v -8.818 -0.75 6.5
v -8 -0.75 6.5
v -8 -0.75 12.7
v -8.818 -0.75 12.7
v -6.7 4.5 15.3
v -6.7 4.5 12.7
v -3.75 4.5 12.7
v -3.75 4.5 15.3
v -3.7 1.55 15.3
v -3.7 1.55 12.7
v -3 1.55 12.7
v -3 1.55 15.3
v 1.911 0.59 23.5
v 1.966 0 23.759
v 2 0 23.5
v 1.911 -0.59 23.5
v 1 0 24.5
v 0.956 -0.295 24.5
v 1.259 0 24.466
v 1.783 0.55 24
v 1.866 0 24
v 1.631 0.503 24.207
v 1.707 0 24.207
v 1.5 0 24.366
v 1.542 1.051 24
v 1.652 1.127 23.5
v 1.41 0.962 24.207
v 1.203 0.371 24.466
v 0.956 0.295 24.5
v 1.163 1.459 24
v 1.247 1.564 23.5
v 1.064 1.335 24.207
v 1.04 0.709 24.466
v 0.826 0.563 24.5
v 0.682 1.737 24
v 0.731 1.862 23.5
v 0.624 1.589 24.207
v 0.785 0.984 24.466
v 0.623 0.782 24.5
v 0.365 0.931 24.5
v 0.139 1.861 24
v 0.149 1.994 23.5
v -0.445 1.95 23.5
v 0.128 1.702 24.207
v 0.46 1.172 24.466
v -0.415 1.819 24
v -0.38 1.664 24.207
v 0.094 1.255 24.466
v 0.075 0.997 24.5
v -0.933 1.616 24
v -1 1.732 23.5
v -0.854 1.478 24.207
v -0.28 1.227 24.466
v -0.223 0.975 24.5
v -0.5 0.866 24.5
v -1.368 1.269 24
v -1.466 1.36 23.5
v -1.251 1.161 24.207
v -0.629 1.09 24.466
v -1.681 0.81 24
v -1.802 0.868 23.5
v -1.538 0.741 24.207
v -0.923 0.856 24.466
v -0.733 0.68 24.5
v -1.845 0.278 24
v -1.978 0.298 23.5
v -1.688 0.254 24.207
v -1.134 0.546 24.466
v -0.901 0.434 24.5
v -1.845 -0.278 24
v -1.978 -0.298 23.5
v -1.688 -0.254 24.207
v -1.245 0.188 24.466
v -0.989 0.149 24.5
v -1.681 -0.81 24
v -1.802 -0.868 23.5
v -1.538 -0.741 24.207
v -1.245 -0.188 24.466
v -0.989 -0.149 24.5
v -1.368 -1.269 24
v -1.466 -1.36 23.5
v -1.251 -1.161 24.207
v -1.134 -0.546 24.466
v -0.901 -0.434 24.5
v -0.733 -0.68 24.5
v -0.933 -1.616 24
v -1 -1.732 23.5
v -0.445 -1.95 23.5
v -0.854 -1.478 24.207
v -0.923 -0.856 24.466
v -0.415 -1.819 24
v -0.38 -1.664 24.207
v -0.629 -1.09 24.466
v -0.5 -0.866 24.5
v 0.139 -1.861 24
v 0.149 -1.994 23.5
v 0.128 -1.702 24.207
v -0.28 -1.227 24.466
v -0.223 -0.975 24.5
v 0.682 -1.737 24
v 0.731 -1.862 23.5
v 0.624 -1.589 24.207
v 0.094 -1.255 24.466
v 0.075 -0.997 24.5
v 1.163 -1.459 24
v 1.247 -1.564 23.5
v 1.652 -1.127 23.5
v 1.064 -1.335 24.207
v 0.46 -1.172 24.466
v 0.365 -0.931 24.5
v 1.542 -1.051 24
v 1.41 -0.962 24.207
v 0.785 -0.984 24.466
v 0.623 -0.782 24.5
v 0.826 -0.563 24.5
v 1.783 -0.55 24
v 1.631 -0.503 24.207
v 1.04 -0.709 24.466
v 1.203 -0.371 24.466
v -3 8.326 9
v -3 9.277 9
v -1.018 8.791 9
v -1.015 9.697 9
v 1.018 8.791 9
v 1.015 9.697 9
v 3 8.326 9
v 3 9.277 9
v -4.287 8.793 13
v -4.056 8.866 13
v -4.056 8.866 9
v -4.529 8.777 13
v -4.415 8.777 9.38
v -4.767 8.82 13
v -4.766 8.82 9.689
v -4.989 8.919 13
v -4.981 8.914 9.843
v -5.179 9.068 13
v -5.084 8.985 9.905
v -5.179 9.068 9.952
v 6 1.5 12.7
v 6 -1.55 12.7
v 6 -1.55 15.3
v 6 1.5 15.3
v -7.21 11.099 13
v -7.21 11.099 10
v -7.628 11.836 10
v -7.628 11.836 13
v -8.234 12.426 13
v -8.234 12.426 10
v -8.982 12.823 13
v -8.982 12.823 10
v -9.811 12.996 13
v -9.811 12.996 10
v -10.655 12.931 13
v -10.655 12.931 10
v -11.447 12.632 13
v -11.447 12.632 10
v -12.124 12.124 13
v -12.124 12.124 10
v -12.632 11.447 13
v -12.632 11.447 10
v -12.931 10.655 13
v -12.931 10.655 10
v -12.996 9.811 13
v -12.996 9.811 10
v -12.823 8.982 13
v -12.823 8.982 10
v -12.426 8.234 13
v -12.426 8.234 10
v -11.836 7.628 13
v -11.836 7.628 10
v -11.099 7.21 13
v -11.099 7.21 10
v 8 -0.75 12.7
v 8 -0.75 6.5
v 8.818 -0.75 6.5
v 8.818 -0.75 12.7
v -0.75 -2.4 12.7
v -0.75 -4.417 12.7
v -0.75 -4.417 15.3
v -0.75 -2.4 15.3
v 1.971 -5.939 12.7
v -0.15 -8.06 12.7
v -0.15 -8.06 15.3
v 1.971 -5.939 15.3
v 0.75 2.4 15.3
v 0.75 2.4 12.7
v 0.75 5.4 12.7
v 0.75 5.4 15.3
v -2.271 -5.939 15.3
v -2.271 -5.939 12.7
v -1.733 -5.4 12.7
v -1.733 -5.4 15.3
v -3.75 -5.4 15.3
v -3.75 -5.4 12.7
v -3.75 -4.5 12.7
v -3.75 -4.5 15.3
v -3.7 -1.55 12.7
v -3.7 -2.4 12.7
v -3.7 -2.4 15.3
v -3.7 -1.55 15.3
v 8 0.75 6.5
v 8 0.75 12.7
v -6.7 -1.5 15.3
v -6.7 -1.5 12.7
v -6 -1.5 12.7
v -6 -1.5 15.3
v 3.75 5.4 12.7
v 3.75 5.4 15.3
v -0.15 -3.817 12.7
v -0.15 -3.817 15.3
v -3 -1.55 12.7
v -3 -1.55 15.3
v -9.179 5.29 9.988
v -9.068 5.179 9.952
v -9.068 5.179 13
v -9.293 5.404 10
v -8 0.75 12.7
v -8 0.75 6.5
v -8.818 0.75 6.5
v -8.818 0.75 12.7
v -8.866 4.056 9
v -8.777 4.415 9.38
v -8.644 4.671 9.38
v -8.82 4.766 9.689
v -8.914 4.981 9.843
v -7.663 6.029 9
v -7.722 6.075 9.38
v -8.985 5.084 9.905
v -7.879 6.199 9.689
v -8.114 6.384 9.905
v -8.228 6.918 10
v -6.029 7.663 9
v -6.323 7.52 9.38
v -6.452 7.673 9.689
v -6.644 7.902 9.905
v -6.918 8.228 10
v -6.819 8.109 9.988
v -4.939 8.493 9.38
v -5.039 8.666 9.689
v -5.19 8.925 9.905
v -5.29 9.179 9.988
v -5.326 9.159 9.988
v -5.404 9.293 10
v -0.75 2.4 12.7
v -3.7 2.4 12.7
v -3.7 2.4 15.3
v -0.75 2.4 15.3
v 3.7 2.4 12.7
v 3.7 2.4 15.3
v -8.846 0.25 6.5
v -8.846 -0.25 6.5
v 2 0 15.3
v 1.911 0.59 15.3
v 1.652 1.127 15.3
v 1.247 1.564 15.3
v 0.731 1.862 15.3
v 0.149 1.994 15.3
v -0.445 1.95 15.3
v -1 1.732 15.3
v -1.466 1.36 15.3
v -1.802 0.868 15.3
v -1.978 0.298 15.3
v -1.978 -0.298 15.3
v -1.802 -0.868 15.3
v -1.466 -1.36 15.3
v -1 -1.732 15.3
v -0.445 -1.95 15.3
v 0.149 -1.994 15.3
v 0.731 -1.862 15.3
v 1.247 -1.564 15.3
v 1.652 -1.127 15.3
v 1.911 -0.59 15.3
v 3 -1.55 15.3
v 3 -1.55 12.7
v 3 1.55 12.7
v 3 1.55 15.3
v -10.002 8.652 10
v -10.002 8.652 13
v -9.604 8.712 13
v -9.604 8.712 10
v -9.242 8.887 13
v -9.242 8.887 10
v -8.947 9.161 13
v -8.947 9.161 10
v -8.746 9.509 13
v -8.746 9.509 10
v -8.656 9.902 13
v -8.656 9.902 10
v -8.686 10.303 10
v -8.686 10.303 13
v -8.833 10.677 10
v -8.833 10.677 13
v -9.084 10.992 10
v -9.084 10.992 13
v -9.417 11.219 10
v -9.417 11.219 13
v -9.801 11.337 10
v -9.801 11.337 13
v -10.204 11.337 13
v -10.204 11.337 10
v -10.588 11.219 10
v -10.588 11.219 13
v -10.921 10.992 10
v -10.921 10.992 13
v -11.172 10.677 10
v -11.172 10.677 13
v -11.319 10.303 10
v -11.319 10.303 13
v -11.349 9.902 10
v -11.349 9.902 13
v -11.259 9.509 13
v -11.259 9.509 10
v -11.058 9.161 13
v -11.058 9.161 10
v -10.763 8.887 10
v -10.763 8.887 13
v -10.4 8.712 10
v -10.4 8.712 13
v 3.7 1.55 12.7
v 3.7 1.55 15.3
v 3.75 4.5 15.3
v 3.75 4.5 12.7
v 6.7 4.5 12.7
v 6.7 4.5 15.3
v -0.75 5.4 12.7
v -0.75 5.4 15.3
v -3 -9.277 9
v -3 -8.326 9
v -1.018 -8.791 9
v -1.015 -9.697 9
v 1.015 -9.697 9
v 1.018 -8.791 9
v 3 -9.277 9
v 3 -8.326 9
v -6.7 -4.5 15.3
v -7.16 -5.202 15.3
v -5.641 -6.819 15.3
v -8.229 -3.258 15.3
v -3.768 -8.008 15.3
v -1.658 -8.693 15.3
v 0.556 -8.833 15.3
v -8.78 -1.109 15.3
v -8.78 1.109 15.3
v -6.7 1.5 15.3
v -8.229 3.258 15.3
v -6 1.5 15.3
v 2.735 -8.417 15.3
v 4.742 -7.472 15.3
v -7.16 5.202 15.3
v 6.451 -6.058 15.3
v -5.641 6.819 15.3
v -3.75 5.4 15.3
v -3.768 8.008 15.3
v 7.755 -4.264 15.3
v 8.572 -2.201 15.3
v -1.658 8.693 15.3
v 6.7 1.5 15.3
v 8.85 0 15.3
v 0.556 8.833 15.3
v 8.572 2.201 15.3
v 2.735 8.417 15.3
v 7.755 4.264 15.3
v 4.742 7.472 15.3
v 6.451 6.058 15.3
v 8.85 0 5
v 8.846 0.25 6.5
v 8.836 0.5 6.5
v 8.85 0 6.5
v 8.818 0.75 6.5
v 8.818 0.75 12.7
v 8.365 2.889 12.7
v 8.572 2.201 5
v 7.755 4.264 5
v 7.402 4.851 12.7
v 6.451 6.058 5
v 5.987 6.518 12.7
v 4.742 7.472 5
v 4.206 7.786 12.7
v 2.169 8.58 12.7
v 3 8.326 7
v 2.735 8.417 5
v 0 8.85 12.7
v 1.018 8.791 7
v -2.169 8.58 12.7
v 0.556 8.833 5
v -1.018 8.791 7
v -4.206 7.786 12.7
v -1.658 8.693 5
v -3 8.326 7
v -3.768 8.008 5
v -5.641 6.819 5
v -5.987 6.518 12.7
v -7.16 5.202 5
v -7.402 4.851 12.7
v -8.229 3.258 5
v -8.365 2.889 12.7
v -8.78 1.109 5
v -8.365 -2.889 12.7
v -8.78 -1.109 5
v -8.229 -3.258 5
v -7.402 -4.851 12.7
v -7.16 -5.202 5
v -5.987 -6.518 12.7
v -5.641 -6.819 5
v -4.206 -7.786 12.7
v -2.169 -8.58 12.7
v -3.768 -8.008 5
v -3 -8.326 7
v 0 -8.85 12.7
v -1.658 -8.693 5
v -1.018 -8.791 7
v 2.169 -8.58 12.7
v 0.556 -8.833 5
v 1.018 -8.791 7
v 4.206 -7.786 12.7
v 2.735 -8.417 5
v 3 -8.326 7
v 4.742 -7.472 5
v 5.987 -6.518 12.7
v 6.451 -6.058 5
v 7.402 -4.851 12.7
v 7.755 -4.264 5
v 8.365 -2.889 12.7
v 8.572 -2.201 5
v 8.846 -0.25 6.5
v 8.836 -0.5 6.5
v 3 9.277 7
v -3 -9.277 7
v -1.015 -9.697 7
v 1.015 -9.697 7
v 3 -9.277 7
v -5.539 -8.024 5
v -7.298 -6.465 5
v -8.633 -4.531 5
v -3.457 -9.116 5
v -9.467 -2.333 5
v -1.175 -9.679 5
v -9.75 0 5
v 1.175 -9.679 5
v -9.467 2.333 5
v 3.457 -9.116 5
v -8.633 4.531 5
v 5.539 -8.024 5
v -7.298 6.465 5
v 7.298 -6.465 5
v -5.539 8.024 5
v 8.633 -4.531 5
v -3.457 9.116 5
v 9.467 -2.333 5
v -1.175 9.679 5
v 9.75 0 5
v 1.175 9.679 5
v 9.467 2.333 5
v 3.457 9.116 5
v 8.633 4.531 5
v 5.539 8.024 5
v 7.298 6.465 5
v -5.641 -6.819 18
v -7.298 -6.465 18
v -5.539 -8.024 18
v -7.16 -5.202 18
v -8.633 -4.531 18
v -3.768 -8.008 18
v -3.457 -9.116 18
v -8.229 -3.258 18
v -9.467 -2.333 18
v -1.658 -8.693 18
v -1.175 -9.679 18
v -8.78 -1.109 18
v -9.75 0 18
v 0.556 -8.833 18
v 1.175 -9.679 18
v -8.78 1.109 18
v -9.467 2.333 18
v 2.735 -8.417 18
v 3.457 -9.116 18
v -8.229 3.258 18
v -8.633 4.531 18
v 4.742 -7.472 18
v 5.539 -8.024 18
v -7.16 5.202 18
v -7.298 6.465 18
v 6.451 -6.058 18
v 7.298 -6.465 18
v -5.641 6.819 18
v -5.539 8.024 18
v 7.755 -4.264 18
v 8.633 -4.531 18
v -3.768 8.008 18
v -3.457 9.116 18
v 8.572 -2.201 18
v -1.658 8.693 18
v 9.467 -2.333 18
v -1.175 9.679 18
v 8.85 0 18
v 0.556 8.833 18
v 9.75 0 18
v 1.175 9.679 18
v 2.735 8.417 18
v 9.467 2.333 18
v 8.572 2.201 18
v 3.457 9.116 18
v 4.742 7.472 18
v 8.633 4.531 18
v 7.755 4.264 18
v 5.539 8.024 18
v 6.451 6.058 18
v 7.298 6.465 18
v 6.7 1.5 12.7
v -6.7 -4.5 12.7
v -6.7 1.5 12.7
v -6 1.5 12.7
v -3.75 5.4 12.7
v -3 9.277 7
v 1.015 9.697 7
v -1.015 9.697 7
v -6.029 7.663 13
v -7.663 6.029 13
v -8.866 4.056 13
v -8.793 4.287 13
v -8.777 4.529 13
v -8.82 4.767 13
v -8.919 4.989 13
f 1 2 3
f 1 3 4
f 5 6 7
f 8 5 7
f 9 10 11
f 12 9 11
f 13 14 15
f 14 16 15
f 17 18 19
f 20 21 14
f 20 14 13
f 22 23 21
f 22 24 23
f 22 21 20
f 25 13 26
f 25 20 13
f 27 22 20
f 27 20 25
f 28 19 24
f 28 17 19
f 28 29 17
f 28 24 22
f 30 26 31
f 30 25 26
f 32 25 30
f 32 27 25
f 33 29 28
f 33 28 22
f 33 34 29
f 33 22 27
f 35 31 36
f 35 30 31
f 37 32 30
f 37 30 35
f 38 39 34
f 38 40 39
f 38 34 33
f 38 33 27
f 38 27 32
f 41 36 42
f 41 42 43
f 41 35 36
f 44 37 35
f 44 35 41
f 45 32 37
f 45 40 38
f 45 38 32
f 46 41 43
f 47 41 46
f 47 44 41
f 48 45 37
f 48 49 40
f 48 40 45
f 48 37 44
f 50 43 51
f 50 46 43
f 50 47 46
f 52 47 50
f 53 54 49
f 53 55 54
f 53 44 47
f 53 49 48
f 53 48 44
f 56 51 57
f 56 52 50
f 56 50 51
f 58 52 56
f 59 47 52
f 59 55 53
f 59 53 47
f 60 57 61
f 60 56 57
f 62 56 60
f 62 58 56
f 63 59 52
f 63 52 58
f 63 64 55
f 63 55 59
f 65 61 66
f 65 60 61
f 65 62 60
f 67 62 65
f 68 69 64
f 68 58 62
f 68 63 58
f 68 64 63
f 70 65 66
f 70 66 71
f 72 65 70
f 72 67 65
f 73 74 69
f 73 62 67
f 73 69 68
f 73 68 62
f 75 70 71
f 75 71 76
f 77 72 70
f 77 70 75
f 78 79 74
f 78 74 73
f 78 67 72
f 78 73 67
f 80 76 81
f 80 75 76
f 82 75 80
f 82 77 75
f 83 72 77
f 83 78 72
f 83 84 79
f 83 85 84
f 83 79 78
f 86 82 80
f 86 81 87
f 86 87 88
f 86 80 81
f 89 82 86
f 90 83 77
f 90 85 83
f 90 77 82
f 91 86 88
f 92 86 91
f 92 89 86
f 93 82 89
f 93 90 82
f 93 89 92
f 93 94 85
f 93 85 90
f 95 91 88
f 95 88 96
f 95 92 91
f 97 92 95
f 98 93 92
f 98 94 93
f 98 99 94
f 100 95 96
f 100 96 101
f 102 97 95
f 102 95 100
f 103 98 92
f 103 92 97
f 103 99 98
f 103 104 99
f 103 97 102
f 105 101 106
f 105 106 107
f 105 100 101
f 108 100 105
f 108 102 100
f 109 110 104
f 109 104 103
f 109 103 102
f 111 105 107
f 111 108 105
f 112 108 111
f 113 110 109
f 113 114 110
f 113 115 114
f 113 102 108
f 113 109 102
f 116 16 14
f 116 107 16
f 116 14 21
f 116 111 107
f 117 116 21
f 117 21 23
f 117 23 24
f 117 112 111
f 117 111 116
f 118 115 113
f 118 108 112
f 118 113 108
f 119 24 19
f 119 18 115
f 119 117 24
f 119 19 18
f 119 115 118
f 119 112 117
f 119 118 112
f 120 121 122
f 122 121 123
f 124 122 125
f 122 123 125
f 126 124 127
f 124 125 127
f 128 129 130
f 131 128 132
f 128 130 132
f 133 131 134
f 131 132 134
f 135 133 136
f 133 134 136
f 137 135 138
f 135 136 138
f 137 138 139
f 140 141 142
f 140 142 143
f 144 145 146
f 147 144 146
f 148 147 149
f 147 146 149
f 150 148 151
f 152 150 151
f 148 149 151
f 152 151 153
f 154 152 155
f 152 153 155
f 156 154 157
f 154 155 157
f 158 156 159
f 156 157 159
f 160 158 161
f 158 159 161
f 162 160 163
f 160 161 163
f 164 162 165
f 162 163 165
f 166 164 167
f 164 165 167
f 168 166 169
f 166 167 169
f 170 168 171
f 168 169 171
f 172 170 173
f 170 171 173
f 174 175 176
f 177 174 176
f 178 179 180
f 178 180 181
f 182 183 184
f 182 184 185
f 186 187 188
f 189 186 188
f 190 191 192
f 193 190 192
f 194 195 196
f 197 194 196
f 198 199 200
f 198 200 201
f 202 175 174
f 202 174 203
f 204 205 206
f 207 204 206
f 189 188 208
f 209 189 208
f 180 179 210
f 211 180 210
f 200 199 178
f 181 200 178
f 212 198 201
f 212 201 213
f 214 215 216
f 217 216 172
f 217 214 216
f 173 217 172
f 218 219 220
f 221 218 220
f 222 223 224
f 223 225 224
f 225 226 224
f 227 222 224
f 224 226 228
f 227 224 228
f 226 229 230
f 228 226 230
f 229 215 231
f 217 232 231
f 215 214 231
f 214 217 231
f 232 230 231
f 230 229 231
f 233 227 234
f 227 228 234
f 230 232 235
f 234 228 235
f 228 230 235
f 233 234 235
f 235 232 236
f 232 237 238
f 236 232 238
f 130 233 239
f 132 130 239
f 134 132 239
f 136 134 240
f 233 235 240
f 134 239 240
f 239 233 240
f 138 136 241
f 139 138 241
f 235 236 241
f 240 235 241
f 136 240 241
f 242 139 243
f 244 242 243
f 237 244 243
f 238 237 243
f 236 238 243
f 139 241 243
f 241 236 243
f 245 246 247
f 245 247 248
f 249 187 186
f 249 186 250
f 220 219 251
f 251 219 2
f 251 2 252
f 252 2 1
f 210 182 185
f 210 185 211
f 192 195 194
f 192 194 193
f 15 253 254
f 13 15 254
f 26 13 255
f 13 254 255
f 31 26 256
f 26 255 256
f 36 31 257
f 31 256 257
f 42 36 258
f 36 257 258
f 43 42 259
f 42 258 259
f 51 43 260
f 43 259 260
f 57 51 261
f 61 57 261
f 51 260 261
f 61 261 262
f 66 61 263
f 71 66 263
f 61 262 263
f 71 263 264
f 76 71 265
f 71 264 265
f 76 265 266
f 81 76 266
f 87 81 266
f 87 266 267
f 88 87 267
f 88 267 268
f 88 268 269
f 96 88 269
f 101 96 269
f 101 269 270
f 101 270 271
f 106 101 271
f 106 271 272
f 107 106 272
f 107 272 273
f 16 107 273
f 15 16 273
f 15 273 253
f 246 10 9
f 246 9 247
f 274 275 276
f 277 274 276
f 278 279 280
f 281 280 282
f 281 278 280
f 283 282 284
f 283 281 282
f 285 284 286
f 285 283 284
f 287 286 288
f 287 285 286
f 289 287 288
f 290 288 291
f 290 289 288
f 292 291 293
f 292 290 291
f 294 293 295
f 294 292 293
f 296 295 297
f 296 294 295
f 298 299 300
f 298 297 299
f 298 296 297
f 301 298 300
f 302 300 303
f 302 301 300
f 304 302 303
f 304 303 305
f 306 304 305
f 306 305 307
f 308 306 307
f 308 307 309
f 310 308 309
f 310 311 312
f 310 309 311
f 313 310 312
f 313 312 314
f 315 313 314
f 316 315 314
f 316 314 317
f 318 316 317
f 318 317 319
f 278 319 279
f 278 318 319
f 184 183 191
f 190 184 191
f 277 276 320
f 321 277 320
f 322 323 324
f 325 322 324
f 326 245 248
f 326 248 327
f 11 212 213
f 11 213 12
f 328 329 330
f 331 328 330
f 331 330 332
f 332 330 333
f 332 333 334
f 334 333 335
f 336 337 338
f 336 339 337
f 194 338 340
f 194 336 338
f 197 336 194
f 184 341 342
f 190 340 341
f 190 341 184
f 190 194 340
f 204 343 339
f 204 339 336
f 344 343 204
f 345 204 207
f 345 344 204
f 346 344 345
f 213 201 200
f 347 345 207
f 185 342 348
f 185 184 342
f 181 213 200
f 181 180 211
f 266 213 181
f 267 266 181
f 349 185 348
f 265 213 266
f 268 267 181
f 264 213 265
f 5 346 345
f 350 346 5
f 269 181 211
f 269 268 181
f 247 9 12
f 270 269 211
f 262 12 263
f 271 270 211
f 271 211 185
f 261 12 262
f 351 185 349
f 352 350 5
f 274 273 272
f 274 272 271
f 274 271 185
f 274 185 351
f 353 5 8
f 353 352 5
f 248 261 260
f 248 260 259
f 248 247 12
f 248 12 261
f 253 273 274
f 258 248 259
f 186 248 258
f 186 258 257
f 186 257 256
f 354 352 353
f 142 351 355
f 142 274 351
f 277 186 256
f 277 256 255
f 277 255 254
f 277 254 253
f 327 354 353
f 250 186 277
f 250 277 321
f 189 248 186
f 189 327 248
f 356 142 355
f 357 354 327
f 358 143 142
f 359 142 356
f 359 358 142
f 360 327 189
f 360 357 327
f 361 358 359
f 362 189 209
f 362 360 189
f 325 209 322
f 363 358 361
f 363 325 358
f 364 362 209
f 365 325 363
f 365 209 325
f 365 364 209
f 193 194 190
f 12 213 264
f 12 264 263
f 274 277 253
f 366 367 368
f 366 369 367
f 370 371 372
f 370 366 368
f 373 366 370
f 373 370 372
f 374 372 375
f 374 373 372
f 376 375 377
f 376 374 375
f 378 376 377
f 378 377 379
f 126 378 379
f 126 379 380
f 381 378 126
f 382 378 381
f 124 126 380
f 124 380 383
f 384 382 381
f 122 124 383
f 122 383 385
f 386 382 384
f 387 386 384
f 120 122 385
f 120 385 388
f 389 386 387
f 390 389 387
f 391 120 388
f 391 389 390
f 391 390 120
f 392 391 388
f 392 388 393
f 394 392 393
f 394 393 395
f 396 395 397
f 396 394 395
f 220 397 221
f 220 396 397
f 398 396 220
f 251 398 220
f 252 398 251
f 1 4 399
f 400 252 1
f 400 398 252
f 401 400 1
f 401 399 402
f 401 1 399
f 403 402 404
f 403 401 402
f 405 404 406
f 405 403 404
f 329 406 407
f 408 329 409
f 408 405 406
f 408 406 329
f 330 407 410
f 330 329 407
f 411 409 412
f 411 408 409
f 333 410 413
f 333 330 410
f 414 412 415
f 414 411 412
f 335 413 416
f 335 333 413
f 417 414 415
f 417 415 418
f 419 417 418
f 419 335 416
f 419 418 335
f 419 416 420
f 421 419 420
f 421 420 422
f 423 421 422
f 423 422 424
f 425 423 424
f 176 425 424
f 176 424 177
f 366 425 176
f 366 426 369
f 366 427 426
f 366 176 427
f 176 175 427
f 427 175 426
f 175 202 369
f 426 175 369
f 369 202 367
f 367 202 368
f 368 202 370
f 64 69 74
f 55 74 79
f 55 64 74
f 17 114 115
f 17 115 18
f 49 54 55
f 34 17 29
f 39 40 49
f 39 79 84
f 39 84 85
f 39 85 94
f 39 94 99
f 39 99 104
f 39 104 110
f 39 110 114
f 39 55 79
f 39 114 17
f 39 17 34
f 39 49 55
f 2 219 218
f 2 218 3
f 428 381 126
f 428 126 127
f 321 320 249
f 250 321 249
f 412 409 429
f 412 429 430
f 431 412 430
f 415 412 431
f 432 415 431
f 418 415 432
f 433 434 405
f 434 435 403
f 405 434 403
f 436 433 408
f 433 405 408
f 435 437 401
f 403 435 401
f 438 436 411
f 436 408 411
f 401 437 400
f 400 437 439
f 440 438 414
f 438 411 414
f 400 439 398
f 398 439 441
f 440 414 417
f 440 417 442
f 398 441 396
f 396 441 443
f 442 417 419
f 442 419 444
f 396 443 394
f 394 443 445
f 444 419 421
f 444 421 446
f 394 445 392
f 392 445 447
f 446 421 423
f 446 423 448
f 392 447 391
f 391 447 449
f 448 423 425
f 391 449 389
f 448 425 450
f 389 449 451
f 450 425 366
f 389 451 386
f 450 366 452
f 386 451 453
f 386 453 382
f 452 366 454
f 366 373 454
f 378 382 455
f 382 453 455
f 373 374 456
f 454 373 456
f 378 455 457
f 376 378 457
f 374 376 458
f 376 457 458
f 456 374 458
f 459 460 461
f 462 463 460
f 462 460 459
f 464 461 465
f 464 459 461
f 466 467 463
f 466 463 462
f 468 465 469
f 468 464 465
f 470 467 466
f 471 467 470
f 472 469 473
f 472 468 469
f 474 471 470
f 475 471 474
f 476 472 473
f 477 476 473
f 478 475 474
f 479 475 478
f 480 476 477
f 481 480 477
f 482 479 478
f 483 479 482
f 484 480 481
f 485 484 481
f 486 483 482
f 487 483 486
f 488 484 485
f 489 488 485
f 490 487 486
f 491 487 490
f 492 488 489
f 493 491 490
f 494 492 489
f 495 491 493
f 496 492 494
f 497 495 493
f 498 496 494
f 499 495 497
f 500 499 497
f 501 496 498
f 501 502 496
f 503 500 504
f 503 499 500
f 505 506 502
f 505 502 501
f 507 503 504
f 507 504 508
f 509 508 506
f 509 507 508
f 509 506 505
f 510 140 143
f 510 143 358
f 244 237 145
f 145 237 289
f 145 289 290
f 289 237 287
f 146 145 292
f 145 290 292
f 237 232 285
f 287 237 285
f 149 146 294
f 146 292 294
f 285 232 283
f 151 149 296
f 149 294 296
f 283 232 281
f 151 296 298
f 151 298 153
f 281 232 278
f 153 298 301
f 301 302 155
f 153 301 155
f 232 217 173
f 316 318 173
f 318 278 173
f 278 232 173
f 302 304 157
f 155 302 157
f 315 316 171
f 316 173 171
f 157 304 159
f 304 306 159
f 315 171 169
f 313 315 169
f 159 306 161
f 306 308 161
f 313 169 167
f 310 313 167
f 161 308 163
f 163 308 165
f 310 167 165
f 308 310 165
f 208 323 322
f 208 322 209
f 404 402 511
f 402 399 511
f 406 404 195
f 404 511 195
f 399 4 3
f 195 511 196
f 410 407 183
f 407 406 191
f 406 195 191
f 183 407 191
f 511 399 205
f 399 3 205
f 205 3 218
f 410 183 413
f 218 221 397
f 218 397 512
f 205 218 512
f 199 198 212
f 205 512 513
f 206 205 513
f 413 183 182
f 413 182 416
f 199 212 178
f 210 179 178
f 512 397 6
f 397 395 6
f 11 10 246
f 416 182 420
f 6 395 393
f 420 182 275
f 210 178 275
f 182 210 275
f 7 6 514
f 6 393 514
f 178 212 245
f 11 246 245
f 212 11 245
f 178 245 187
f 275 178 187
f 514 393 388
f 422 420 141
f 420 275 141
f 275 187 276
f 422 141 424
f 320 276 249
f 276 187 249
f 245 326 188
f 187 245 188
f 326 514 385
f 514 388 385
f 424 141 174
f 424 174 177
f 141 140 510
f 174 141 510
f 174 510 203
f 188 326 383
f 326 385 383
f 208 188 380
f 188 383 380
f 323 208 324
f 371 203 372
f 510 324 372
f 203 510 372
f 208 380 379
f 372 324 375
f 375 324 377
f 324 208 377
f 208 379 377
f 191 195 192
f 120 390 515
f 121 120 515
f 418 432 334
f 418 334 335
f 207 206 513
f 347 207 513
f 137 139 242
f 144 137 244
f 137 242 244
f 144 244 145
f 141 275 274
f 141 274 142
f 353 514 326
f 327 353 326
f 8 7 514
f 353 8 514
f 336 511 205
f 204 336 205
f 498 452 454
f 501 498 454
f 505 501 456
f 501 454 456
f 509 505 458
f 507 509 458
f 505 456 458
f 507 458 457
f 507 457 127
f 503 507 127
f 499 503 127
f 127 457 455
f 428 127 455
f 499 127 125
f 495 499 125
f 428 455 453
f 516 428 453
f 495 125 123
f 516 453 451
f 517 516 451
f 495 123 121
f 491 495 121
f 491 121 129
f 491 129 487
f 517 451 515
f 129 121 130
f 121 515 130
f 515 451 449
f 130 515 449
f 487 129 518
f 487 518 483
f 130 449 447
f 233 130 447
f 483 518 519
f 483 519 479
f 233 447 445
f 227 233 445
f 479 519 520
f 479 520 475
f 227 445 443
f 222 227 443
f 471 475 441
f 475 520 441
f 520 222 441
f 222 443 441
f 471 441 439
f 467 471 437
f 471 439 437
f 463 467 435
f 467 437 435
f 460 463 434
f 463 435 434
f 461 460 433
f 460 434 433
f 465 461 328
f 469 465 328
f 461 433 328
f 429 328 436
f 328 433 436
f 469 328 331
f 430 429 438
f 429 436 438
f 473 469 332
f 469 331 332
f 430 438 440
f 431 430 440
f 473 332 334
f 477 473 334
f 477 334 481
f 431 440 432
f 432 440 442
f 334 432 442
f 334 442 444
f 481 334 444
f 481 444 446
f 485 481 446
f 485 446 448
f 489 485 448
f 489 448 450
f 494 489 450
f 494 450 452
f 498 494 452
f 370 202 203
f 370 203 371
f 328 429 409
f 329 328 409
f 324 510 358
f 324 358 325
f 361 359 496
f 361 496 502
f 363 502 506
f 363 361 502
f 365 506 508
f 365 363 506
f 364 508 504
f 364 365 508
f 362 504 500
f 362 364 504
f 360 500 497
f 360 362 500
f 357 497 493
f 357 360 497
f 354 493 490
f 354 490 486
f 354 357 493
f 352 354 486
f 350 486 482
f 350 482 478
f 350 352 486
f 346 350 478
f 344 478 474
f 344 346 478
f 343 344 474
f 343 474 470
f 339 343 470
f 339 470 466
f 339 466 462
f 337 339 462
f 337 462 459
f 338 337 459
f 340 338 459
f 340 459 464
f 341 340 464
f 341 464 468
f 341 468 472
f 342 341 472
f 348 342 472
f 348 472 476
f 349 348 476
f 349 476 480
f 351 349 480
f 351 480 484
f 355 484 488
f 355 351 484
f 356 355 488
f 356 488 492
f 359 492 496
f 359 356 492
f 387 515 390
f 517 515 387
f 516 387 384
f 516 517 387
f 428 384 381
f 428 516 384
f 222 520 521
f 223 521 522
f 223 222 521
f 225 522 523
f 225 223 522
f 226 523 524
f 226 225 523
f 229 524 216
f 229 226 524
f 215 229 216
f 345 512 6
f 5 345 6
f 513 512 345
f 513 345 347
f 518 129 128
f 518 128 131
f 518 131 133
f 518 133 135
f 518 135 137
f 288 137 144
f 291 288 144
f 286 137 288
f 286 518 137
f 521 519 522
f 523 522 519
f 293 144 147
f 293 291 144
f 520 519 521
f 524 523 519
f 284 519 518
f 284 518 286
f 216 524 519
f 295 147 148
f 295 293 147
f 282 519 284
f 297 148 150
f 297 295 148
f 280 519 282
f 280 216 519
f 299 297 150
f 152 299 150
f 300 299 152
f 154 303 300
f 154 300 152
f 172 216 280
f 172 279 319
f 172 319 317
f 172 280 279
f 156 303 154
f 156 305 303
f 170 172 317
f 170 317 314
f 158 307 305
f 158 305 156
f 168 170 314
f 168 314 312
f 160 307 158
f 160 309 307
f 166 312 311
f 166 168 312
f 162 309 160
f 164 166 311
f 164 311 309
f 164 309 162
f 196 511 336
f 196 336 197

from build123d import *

# Parameters (mm, degrees)
BOX006_W               = 6
BOX006_H               = 20
BOX006_DEPTH           = 2
CYLINDER022_R          = 8.85
CYLINDER022_DEPTH      = 15
CYLINDER019_R          = 1.35
CYLINDER019_DEPTH      = 5
CYLINDER002_R          = 3
CYLINDER002_DEPTH      = 3
CYLINDER018_R          = 8.85
CYLINDER018_DEPTH      = 13
CYLINDER017_R          = 9.75
CYLINDER017_DEPTH      = 13
BOX_W                  = 6
BOX_H                  = 5.5
BOX_DEPTH              = 3
BOX_PLACEMENT_ANGLE    = 135
BOX005_W               = 1
BOX005_H               = 1.5
BOX005_DEPTH           = 7.7
BOX004_W               = 1
BOX004_H               = 1.5
BOX004_DEPTH           = 7.7
FILLET003_R            = 1
BOX015_W               = 3
BOX015_H               = 3
BOX015_DEPTH           = 2.8
BOX016_W               = 3
BOX016_H               = 3.1
BOX016_DEPTH           = 2.8
BOX014_W               = 3
BOX014_H               = 3
BOX014_DEPTH           = 2.8
BOX013_W               = 3
BOX013_H               = 3
BOX013_DEPTH           = 2.8
BOX012_W               = 3
BOX012_H               = 3.1
BOX012_DEPTH           = 2.8
BOX011_W               = 3
BOX011_H               = 3
BOX011_DEPTH           = 2.8
BOX010_W               = 3
BOX010_H               = 3
BOX010_DEPTH           = 2.8
BOX009_W               = 3
BOX009_H               = 3
BOX009_DEPTH           = 2.8
BOX009_PLACEMENT_ANGLE = 45
BOX017_W               = 3
BOX017_H               = 3
BOX017_DEPTH           = 2.8
CYLINDER044_R          = 9
CYLINDER044_DEPTH      = 2.6
CYLINDER001_R          = 2
CYLINDER001_DEPTH      = 10.5
FILLET_R               = 1


with BuildPart() as cube006:
    # Box006 → Box006 (new body)
    with BuildSketch(Plane(origin=(-3, -10, -3), x_dir=(1, 0, 0), z_dir=(0, 0, 1))):
        with Locations((3, 10)):
            Rectangle(BOX006_W, BOX006_H)
    extrude(amount=BOX006_DEPTH)


with BuildPart() as cylinder022:
    # Cylinder022 → Cylinder022 (new body)
    with BuildSketch(Plane.XY.offset(-6)):
        Circle(CYLINDER022_R)
    extrude(amount=CYLINDER022_DEPTH)


with BuildPart() as cylinder019:
    # Cylinder019 → Cylinder019 (new body)
    with BuildSketch(Plane(origin=(-10.002388, 10.002388, 0), x_dir=(0, -1, 0), z_dir=(0, 0, 1))):
        Circle(CYLINDER019_R)
    extrude(amount=CYLINDER019_DEPTH)


with BuildPart() as attachement_point:
    # Cylinder002 → Cylinder002 (new body)
    with BuildSketch(Plane(origin=(-10.002388, 10.002388, 0), x_dir=(0, -1, 0), z_dir=(0, 0, 1))):
        Circle(CYLINDER002_R)
    extrude(amount=CYLINDER002_DEPTH)


with BuildPart() as negative:
    # Cylinder018 → Cylinder018 (new body)
    with BuildSketch(Plane.XY.offset(-5)):
        Circle(CYLINDER018_R)
    extrude(amount=CYLINDER018_DEPTH)


with BuildPart() as outer_wall:
    # Cylinder017 → Cylinder017 (new body)
    with BuildSketch(Plane.XY.offset(-5)):
        Circle(CYLINDER017_R)
    extrude(amount=CYLINDER017_DEPTH)

    # Cut008: cut Negative
    add(negative.part, mode=Mode.SUBTRACT)


with BuildPart() as connect:
    # Box → Box (new body)
    with BuildSketch(Plane.XY):
        with Locations((3, 2.75)):
            Rectangle(BOX_W, BOX_H)
    extrude(amount=BOX_DEPTH)


with BuildPart() as connect_1:
    # Box placement: moved
    add(connect.part.moved(Location((-3.005204, 6.894291, 0))).rotate(Axis((-3.005204, 6.894291, 0), (0, 0, 1)), BOX_PLACEMENT_ANGLE))

    # Fusion008: union Attachement Point, Outer Wall
    add(attachement_point.part)
    add(outer_wall.part)

    # Cut: cut Cylinder019
    add(cylinder019.part, mode=Mode.SUBTRACT)

    # Cut009: cut Cylinder022
    add(cylinder022.part, mode=Mode.SUBTRACT)


with BuildPart() as cube005:
    # Box005 → Box005 (new body)
    with BuildSketch(Plane(origin=(-8, 0.75, -3.5), x_dir=(-1, 0, 0), z_dir=(0, 0, 1))):
        with Locations((0.5, 0.75)):
            Rectangle(BOX005_W, BOX005_H)
    extrude(amount=BOX005_DEPTH)


with BuildPart() as fillet003:
    # Box004 → Box004 (new body)
    with BuildSketch(Plane(origin=(8, -0.75, -3.5), x_dir=(1, 0, 0), z_dir=(0, 0, 1))):
        with Locations((0.5, 0.75)):
            Rectangle(BOX004_W, BOX004_H)
    extrude(amount=BOX004_DEPTH)

    # Fusion: union Cube005
    add(cube005.part)

    # Fusion024: union Connect
    add(connect_1.part)

    # Cut013012: cut Cube006
    add(cube006.part, mode=Mode.SUBTRACT)

    # Fillet003
    fillet003_edges = [fillet003.edges().sort_by_distance(p)[0] for p in [
        (-6.894291, 6.894291, 0),
        (-4.669835, 8.558922, 1.5),
        (-8.558922, 4.669835, 1.5),
    ]]
    fillet(fillet003_edges, radius=FILLET003_R)


with BuildPart() as cube015:
    # Box015 → Box015 (new body)
    with BuildSketch(Plane(origin=(3.7, 1.5, 2.6), x_dir=(1, 0, 0), z_dir=(0, 0, 1))):
        with Locations((1.5, 1.5)):
            Rectangle(BOX015_W, BOX015_H)
    extrude(amount=BOX015_DEPTH)


with BuildPart() as cube016:
    # Box016 → Box016 (new body)
    with BuildSketch(Plane(origin=(3, -1.55, 2.6), x_dir=(1, 0, 0), z_dir=(0, 0, 1))):
        with Locations((1.5, 1.55)):
            Rectangle(BOX016_W, BOX016_H)
    extrude(amount=BOX016_DEPTH)


with BuildPart() as fusion027:
    # Box014 → Box014 (new body)
    with BuildSketch(Plane(origin=(0.75, 2.4, 2.6), x_dir=(1, 0, 0), z_dir=(0, 0, 1))):
        with Locations((1.5, 1.5)):
            Rectangle(BOX014_W, BOX014_H)
    extrude(amount=BOX014_DEPTH)

    # Fusion027: union Cube015, Cube016
    add(cube015.part)
    add(cube016.part)


with BuildPart() as cube013:
    # Box013 → Box013 (new body)
    with BuildSketch(Plane(origin=(-6.7, 1.5, 2.6), x_dir=(1, 0, 0), z_dir=(0, 0, 1))):
        with Locations((1.5, 1.5)):
            Rectangle(BOX013_W, BOX013_H)
    extrude(amount=BOX013_DEPTH)


with BuildPart() as cube012:
    # Box012 → Box012 (new body)
    with BuildSketch(Plane(origin=(-6, -1.55, 2.6), x_dir=(1, 0, 0), z_dir=(0, 0, 1))):
        with Locations((1.5, 1.55)):
            Rectangle(BOX012_W, BOX012_H)
    extrude(amount=BOX012_DEPTH)


with BuildPart() as cube011:
    # Box011 → Box011 (new body)
    with BuildSketch(Plane(origin=(-6.7, -4.5, 2.6), x_dir=(1, 0, 0), z_dir=(0, 0, 1))):
        with Locations((1.5, 1.5)):
            Rectangle(BOX011_W, BOX011_H)
    extrude(amount=BOX011_DEPTH)


with BuildPart() as cube010:
    # Box010 → Box010 (new body)
    with BuildSketch(Plane(origin=(-3.75, -5.4, 2.6), x_dir=(1, 0, 0), z_dir=(0, 0, 1))):
        with Locations((1.5, 1.5)):
            Rectangle(BOX010_W, BOX010_H)
    extrude(amount=BOX010_DEPTH)


with BuildPart() as cube009:
    # Box009 → Box009 (new body)
    with BuildSketch(Plane.XY):
        with Locations((1.5, 1.5)):
            Rectangle(BOX009_W, BOX009_H)
    extrude(amount=BOX009_DEPTH)


with BuildPart() as cube009_1:
    # Box009 placement: moved
    add(cube009.part.moved(Location((-0.15, -8.06, 2.6))).rotate(Axis((-0.15, -8.06, 2.6), (0, 0, 1)), BOX009_PLACEMENT_ANGLE))


with BuildPart() as compound:
    # Box017 → Box017 (new body)
    with BuildSketch(Plane(origin=(-3.75, 2.4, 2.6), x_dir=(1, 0, 0), z_dir=(0, 0, 1))):
        with Locations((1.5, 1.5)):
            Rectangle(BOX017_W, BOX017_H)
    extrude(amount=BOX017_DEPTH)

    # Fusion026: union Cube013, Cube012, Cube011, Cube010, Cube009
    add(cube013.part)
    add(cube012.part)
    add(cube011.part)
    add(cube010.part)
    add(cube009_1.part)

    # Compound: union Fusion027
    add(fusion027.part)


with BuildPart() as cut013013:
    # Cylinder044 → Cylinder044 (new body)
    with BuildSketch(Plane.XY.offset(2.7)):
        Circle(CYLINDER044_R)
    extrude(amount=CYLINDER044_DEPTH)

    # Cut013013: cut Compound
    add(compound.part, mode=Mode.SUBTRACT)


with BuildPart() as connector_base:
    # Cylinder001 → Cylinder001 (new body)
    with BuildSketch(Plane.XY.offset(4)):
        Circle(CYLINDER001_R)
    extrude(amount=CYLINDER001_DEPTH)

    # Fillet
    fillet_edges = [connector_base.edges().sort_by_distance(p)[0] for p in [
        (-2, 0, 14.5),
    ]]
    fillet(fillet_edges, radius=FILLET_R)

    # Fusion023: union Cut013013
    add(cut013013.part)

    # Fusion025: union Fillet003
    add(fillet003.part)


with BuildPart() as connector_base_1:
    # Fusion025 placement: moved
    add(connector_base.part.moved(Location((0, 0, 10))))


solid = connector_base_1.part
